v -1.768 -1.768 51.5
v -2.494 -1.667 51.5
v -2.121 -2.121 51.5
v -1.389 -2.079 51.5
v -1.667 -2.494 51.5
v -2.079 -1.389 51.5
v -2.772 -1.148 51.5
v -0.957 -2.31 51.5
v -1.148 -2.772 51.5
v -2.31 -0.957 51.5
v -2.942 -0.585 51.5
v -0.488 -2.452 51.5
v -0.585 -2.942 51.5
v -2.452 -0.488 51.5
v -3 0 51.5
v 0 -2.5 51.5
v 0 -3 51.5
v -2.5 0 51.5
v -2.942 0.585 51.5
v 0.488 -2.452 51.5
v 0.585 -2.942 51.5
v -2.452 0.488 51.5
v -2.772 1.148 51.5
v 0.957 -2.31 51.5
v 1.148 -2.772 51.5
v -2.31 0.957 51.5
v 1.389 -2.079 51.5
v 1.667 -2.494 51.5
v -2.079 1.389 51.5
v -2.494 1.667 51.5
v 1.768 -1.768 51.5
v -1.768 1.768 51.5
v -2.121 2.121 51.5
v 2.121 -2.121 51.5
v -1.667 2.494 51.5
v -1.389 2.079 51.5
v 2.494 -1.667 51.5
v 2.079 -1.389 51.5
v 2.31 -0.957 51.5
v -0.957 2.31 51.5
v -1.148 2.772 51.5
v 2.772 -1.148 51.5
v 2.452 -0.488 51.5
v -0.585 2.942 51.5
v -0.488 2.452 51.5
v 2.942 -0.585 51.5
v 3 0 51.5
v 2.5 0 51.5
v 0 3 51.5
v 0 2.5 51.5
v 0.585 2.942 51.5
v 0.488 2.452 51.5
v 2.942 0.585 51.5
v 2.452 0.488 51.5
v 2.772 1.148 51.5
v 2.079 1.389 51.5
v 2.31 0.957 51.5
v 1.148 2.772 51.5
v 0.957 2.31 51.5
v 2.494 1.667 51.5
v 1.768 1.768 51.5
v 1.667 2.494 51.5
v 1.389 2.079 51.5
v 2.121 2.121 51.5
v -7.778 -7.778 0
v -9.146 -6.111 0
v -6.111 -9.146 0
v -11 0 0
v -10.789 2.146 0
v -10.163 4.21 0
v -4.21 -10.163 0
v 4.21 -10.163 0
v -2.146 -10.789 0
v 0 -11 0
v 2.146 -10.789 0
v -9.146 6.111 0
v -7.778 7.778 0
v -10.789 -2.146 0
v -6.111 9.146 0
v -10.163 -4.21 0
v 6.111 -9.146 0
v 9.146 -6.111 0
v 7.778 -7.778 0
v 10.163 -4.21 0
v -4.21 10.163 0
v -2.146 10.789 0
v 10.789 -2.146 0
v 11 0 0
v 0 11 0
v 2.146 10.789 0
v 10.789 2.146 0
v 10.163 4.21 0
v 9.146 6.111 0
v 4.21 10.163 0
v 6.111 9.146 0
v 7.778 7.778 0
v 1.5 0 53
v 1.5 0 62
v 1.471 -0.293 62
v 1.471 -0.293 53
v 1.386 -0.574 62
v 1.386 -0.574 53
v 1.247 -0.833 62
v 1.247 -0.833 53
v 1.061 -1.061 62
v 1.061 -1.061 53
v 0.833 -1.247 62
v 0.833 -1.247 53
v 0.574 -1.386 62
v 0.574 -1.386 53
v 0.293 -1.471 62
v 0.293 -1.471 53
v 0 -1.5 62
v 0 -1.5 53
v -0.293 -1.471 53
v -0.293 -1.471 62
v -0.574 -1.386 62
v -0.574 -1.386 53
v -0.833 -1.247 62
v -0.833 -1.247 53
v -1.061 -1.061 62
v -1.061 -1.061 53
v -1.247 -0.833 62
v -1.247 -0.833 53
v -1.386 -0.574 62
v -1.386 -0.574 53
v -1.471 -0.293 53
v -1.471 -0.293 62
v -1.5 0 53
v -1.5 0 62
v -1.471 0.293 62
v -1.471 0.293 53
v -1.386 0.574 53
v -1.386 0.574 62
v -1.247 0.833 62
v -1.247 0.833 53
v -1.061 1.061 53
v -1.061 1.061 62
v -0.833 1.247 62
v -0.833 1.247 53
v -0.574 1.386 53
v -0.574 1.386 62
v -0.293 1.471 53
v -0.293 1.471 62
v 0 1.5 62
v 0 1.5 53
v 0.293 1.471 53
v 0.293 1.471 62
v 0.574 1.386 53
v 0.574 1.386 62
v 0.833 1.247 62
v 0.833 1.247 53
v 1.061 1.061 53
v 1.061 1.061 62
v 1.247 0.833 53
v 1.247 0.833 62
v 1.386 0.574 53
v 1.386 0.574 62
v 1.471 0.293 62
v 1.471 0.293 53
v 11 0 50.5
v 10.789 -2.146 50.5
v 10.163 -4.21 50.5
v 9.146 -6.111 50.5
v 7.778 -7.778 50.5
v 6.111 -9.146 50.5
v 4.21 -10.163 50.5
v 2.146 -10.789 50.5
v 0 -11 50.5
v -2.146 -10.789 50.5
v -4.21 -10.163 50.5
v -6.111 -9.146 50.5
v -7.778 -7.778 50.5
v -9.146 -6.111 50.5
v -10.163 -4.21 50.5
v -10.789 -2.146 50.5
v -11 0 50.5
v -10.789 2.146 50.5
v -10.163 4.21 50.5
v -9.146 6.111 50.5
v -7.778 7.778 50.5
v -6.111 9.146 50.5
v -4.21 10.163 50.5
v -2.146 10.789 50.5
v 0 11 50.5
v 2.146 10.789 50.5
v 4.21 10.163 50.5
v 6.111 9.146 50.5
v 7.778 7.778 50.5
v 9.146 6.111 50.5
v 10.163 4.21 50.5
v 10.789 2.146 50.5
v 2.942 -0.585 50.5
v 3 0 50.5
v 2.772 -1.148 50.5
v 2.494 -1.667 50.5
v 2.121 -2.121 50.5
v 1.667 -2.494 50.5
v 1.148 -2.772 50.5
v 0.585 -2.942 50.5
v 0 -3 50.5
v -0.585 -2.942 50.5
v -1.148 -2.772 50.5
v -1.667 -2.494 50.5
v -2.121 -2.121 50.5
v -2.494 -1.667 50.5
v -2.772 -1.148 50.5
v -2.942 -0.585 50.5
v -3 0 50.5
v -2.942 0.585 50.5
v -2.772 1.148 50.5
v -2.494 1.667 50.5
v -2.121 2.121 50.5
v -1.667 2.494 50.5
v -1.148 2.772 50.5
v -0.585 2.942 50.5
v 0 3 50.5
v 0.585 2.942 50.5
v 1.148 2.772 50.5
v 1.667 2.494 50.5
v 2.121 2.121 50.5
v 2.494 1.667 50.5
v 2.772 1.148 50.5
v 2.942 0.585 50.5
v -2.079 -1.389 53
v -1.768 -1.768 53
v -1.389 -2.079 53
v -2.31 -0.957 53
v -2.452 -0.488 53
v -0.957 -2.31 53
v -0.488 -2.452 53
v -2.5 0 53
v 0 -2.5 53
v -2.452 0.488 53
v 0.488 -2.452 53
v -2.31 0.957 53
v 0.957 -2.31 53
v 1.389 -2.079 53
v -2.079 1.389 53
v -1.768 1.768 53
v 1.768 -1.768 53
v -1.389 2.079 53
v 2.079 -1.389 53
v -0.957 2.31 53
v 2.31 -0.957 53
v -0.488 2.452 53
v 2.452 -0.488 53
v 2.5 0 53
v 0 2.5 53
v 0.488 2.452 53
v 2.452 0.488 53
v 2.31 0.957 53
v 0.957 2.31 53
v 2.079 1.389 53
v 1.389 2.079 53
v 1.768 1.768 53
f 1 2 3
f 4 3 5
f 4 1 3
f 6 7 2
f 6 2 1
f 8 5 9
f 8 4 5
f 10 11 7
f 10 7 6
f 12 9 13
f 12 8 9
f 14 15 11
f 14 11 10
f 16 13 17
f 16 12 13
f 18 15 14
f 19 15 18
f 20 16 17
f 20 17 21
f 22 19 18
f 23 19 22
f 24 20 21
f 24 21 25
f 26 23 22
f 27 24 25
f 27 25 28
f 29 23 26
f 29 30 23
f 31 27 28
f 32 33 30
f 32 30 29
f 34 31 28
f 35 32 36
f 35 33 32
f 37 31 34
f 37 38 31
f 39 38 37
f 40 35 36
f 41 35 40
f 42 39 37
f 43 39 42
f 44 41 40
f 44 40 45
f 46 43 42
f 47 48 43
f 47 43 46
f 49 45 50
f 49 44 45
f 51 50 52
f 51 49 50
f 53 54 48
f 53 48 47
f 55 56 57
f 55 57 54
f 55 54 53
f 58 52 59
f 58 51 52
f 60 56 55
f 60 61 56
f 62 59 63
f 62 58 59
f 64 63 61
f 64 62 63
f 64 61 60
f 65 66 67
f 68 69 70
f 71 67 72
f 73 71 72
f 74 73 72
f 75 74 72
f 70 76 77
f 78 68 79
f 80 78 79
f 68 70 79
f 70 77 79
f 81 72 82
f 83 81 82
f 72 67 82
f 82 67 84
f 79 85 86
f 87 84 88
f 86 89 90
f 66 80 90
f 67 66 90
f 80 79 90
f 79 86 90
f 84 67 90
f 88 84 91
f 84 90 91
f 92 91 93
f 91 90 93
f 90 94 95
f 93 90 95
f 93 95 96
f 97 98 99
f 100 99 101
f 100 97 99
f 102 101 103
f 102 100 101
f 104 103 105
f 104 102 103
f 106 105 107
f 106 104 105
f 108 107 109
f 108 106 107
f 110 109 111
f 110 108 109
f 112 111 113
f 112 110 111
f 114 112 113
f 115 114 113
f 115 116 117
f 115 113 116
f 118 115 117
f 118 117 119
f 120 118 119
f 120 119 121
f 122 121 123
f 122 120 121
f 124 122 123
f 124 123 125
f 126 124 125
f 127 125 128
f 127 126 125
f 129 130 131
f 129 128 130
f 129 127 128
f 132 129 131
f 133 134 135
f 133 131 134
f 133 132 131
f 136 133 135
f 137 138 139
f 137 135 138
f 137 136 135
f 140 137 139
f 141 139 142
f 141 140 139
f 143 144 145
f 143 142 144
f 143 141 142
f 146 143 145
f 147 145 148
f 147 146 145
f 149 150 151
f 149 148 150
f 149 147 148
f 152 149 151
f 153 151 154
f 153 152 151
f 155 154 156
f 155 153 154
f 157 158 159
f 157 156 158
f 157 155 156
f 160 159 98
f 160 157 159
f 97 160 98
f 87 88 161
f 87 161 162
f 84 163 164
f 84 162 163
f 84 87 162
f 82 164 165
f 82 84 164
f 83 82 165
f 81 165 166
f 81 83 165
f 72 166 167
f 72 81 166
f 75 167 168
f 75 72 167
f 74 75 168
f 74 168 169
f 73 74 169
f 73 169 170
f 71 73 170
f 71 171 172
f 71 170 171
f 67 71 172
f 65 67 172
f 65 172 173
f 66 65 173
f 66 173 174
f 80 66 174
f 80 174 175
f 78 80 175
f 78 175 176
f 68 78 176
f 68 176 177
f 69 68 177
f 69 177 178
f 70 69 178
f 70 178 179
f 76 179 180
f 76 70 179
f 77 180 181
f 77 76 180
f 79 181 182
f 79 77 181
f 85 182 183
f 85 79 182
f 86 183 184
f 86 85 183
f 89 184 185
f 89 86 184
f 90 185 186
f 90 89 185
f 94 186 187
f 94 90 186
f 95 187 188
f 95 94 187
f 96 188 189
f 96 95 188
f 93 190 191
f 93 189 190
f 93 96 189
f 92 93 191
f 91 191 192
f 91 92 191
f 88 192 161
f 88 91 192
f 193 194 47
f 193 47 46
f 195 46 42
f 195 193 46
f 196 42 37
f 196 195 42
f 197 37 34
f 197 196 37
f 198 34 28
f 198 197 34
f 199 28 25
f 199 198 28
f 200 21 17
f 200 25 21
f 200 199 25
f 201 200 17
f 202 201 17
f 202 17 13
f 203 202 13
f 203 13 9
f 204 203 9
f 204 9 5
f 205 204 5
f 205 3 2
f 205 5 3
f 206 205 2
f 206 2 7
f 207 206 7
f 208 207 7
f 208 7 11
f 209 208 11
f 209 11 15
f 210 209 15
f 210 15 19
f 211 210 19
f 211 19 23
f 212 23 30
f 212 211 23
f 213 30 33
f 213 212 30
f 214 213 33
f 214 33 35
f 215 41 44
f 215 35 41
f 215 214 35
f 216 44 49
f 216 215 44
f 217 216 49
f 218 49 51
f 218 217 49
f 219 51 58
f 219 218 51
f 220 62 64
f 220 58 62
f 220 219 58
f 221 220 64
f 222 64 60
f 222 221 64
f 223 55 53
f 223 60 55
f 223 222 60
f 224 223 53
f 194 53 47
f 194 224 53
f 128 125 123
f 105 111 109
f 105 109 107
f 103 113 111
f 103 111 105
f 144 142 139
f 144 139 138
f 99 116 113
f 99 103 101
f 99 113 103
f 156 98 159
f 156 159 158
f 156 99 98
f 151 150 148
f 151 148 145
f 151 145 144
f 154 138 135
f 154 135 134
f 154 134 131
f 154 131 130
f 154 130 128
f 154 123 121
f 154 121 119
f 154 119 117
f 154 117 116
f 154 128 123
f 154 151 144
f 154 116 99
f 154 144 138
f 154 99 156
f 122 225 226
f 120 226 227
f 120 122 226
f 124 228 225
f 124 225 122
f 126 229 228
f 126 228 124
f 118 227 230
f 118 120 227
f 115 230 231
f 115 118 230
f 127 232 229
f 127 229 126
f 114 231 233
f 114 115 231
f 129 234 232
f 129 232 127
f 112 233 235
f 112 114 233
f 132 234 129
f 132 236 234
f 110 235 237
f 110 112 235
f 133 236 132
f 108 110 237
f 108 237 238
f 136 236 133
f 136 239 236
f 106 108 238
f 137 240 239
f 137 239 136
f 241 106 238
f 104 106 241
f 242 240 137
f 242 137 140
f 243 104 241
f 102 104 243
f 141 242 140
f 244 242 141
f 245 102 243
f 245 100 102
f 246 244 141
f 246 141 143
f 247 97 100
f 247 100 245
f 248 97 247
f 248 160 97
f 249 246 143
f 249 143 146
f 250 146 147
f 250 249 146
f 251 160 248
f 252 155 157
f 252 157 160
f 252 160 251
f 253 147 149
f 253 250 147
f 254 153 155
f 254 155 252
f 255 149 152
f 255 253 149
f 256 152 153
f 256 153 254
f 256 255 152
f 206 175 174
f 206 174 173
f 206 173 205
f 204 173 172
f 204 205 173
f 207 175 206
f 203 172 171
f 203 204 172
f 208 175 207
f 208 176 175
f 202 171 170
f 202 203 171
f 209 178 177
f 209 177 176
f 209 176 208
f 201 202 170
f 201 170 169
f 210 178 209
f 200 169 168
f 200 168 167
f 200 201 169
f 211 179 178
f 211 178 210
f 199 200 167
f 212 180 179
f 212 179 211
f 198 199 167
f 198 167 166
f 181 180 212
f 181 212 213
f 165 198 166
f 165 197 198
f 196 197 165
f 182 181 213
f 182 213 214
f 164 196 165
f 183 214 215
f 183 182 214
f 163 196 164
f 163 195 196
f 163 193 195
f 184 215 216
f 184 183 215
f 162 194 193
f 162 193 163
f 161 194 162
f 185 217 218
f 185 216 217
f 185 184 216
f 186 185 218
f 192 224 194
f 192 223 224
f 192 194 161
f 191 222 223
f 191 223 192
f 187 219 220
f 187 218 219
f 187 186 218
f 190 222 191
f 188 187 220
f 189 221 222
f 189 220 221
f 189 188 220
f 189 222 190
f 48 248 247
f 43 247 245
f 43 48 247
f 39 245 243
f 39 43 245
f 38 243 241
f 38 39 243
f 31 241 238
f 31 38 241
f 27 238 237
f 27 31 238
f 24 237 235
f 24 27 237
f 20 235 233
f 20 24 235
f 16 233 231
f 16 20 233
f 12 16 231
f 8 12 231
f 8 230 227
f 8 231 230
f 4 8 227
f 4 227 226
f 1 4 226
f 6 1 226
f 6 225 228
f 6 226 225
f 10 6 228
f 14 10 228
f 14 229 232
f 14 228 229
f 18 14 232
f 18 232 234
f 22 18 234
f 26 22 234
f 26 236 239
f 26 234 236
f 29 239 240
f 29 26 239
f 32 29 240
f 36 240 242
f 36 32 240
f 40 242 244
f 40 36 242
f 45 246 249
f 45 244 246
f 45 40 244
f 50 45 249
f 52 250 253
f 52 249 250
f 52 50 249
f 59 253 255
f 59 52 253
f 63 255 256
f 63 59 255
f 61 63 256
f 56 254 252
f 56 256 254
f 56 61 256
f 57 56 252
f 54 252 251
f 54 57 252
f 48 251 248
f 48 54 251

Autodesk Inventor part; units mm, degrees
ref_plane "YZ Plane" through (0, 0, 0) normal (1, 0, 0) x (0, 1, 0)
ref_plane "XZ Plane" through (0, 0, 0) normal (0, 1, 0) x (-1, 0, 0)
ref_plane "XY Plane" through (0, 0, 0) normal (0, 0, 1) x (1, 0, 0)
sketch "Skizze1" plane through (0, 0, 0) normal (0, 0, 1) x (1, 0, 0)
  circle A0 centre (0, 0) radius 11
  dimension "d0" = 22
extrude "Extrusion1" add sketch "Skizze1" along normal blind 50.5
sketch "Skizze2" plane through (0, 0, 50.5) normal (0, 0, 1) x (1, 0, 0)
  circle A0 centre (0, 0) radius 3
  circle A1 centre (0, 0) radius 2.5
  circle A2 centre (0, 0) radius 1.5
  dimension "d3" = 6
  dimension "d4" = 5
  dimension "d9" = 3
extrude "Extrusion2" add sketch "Skizze2" along normal blind 1 contours A0 | A1 | A2
extrude "Extrusion3" add sketch "Skizze2" along normal blind 2.5 contours A1 | A2
extrude "Extrusion4" add sketch "Skizze2" along normal blind 11.5 contours A2
properties part number "MotorStanger"
